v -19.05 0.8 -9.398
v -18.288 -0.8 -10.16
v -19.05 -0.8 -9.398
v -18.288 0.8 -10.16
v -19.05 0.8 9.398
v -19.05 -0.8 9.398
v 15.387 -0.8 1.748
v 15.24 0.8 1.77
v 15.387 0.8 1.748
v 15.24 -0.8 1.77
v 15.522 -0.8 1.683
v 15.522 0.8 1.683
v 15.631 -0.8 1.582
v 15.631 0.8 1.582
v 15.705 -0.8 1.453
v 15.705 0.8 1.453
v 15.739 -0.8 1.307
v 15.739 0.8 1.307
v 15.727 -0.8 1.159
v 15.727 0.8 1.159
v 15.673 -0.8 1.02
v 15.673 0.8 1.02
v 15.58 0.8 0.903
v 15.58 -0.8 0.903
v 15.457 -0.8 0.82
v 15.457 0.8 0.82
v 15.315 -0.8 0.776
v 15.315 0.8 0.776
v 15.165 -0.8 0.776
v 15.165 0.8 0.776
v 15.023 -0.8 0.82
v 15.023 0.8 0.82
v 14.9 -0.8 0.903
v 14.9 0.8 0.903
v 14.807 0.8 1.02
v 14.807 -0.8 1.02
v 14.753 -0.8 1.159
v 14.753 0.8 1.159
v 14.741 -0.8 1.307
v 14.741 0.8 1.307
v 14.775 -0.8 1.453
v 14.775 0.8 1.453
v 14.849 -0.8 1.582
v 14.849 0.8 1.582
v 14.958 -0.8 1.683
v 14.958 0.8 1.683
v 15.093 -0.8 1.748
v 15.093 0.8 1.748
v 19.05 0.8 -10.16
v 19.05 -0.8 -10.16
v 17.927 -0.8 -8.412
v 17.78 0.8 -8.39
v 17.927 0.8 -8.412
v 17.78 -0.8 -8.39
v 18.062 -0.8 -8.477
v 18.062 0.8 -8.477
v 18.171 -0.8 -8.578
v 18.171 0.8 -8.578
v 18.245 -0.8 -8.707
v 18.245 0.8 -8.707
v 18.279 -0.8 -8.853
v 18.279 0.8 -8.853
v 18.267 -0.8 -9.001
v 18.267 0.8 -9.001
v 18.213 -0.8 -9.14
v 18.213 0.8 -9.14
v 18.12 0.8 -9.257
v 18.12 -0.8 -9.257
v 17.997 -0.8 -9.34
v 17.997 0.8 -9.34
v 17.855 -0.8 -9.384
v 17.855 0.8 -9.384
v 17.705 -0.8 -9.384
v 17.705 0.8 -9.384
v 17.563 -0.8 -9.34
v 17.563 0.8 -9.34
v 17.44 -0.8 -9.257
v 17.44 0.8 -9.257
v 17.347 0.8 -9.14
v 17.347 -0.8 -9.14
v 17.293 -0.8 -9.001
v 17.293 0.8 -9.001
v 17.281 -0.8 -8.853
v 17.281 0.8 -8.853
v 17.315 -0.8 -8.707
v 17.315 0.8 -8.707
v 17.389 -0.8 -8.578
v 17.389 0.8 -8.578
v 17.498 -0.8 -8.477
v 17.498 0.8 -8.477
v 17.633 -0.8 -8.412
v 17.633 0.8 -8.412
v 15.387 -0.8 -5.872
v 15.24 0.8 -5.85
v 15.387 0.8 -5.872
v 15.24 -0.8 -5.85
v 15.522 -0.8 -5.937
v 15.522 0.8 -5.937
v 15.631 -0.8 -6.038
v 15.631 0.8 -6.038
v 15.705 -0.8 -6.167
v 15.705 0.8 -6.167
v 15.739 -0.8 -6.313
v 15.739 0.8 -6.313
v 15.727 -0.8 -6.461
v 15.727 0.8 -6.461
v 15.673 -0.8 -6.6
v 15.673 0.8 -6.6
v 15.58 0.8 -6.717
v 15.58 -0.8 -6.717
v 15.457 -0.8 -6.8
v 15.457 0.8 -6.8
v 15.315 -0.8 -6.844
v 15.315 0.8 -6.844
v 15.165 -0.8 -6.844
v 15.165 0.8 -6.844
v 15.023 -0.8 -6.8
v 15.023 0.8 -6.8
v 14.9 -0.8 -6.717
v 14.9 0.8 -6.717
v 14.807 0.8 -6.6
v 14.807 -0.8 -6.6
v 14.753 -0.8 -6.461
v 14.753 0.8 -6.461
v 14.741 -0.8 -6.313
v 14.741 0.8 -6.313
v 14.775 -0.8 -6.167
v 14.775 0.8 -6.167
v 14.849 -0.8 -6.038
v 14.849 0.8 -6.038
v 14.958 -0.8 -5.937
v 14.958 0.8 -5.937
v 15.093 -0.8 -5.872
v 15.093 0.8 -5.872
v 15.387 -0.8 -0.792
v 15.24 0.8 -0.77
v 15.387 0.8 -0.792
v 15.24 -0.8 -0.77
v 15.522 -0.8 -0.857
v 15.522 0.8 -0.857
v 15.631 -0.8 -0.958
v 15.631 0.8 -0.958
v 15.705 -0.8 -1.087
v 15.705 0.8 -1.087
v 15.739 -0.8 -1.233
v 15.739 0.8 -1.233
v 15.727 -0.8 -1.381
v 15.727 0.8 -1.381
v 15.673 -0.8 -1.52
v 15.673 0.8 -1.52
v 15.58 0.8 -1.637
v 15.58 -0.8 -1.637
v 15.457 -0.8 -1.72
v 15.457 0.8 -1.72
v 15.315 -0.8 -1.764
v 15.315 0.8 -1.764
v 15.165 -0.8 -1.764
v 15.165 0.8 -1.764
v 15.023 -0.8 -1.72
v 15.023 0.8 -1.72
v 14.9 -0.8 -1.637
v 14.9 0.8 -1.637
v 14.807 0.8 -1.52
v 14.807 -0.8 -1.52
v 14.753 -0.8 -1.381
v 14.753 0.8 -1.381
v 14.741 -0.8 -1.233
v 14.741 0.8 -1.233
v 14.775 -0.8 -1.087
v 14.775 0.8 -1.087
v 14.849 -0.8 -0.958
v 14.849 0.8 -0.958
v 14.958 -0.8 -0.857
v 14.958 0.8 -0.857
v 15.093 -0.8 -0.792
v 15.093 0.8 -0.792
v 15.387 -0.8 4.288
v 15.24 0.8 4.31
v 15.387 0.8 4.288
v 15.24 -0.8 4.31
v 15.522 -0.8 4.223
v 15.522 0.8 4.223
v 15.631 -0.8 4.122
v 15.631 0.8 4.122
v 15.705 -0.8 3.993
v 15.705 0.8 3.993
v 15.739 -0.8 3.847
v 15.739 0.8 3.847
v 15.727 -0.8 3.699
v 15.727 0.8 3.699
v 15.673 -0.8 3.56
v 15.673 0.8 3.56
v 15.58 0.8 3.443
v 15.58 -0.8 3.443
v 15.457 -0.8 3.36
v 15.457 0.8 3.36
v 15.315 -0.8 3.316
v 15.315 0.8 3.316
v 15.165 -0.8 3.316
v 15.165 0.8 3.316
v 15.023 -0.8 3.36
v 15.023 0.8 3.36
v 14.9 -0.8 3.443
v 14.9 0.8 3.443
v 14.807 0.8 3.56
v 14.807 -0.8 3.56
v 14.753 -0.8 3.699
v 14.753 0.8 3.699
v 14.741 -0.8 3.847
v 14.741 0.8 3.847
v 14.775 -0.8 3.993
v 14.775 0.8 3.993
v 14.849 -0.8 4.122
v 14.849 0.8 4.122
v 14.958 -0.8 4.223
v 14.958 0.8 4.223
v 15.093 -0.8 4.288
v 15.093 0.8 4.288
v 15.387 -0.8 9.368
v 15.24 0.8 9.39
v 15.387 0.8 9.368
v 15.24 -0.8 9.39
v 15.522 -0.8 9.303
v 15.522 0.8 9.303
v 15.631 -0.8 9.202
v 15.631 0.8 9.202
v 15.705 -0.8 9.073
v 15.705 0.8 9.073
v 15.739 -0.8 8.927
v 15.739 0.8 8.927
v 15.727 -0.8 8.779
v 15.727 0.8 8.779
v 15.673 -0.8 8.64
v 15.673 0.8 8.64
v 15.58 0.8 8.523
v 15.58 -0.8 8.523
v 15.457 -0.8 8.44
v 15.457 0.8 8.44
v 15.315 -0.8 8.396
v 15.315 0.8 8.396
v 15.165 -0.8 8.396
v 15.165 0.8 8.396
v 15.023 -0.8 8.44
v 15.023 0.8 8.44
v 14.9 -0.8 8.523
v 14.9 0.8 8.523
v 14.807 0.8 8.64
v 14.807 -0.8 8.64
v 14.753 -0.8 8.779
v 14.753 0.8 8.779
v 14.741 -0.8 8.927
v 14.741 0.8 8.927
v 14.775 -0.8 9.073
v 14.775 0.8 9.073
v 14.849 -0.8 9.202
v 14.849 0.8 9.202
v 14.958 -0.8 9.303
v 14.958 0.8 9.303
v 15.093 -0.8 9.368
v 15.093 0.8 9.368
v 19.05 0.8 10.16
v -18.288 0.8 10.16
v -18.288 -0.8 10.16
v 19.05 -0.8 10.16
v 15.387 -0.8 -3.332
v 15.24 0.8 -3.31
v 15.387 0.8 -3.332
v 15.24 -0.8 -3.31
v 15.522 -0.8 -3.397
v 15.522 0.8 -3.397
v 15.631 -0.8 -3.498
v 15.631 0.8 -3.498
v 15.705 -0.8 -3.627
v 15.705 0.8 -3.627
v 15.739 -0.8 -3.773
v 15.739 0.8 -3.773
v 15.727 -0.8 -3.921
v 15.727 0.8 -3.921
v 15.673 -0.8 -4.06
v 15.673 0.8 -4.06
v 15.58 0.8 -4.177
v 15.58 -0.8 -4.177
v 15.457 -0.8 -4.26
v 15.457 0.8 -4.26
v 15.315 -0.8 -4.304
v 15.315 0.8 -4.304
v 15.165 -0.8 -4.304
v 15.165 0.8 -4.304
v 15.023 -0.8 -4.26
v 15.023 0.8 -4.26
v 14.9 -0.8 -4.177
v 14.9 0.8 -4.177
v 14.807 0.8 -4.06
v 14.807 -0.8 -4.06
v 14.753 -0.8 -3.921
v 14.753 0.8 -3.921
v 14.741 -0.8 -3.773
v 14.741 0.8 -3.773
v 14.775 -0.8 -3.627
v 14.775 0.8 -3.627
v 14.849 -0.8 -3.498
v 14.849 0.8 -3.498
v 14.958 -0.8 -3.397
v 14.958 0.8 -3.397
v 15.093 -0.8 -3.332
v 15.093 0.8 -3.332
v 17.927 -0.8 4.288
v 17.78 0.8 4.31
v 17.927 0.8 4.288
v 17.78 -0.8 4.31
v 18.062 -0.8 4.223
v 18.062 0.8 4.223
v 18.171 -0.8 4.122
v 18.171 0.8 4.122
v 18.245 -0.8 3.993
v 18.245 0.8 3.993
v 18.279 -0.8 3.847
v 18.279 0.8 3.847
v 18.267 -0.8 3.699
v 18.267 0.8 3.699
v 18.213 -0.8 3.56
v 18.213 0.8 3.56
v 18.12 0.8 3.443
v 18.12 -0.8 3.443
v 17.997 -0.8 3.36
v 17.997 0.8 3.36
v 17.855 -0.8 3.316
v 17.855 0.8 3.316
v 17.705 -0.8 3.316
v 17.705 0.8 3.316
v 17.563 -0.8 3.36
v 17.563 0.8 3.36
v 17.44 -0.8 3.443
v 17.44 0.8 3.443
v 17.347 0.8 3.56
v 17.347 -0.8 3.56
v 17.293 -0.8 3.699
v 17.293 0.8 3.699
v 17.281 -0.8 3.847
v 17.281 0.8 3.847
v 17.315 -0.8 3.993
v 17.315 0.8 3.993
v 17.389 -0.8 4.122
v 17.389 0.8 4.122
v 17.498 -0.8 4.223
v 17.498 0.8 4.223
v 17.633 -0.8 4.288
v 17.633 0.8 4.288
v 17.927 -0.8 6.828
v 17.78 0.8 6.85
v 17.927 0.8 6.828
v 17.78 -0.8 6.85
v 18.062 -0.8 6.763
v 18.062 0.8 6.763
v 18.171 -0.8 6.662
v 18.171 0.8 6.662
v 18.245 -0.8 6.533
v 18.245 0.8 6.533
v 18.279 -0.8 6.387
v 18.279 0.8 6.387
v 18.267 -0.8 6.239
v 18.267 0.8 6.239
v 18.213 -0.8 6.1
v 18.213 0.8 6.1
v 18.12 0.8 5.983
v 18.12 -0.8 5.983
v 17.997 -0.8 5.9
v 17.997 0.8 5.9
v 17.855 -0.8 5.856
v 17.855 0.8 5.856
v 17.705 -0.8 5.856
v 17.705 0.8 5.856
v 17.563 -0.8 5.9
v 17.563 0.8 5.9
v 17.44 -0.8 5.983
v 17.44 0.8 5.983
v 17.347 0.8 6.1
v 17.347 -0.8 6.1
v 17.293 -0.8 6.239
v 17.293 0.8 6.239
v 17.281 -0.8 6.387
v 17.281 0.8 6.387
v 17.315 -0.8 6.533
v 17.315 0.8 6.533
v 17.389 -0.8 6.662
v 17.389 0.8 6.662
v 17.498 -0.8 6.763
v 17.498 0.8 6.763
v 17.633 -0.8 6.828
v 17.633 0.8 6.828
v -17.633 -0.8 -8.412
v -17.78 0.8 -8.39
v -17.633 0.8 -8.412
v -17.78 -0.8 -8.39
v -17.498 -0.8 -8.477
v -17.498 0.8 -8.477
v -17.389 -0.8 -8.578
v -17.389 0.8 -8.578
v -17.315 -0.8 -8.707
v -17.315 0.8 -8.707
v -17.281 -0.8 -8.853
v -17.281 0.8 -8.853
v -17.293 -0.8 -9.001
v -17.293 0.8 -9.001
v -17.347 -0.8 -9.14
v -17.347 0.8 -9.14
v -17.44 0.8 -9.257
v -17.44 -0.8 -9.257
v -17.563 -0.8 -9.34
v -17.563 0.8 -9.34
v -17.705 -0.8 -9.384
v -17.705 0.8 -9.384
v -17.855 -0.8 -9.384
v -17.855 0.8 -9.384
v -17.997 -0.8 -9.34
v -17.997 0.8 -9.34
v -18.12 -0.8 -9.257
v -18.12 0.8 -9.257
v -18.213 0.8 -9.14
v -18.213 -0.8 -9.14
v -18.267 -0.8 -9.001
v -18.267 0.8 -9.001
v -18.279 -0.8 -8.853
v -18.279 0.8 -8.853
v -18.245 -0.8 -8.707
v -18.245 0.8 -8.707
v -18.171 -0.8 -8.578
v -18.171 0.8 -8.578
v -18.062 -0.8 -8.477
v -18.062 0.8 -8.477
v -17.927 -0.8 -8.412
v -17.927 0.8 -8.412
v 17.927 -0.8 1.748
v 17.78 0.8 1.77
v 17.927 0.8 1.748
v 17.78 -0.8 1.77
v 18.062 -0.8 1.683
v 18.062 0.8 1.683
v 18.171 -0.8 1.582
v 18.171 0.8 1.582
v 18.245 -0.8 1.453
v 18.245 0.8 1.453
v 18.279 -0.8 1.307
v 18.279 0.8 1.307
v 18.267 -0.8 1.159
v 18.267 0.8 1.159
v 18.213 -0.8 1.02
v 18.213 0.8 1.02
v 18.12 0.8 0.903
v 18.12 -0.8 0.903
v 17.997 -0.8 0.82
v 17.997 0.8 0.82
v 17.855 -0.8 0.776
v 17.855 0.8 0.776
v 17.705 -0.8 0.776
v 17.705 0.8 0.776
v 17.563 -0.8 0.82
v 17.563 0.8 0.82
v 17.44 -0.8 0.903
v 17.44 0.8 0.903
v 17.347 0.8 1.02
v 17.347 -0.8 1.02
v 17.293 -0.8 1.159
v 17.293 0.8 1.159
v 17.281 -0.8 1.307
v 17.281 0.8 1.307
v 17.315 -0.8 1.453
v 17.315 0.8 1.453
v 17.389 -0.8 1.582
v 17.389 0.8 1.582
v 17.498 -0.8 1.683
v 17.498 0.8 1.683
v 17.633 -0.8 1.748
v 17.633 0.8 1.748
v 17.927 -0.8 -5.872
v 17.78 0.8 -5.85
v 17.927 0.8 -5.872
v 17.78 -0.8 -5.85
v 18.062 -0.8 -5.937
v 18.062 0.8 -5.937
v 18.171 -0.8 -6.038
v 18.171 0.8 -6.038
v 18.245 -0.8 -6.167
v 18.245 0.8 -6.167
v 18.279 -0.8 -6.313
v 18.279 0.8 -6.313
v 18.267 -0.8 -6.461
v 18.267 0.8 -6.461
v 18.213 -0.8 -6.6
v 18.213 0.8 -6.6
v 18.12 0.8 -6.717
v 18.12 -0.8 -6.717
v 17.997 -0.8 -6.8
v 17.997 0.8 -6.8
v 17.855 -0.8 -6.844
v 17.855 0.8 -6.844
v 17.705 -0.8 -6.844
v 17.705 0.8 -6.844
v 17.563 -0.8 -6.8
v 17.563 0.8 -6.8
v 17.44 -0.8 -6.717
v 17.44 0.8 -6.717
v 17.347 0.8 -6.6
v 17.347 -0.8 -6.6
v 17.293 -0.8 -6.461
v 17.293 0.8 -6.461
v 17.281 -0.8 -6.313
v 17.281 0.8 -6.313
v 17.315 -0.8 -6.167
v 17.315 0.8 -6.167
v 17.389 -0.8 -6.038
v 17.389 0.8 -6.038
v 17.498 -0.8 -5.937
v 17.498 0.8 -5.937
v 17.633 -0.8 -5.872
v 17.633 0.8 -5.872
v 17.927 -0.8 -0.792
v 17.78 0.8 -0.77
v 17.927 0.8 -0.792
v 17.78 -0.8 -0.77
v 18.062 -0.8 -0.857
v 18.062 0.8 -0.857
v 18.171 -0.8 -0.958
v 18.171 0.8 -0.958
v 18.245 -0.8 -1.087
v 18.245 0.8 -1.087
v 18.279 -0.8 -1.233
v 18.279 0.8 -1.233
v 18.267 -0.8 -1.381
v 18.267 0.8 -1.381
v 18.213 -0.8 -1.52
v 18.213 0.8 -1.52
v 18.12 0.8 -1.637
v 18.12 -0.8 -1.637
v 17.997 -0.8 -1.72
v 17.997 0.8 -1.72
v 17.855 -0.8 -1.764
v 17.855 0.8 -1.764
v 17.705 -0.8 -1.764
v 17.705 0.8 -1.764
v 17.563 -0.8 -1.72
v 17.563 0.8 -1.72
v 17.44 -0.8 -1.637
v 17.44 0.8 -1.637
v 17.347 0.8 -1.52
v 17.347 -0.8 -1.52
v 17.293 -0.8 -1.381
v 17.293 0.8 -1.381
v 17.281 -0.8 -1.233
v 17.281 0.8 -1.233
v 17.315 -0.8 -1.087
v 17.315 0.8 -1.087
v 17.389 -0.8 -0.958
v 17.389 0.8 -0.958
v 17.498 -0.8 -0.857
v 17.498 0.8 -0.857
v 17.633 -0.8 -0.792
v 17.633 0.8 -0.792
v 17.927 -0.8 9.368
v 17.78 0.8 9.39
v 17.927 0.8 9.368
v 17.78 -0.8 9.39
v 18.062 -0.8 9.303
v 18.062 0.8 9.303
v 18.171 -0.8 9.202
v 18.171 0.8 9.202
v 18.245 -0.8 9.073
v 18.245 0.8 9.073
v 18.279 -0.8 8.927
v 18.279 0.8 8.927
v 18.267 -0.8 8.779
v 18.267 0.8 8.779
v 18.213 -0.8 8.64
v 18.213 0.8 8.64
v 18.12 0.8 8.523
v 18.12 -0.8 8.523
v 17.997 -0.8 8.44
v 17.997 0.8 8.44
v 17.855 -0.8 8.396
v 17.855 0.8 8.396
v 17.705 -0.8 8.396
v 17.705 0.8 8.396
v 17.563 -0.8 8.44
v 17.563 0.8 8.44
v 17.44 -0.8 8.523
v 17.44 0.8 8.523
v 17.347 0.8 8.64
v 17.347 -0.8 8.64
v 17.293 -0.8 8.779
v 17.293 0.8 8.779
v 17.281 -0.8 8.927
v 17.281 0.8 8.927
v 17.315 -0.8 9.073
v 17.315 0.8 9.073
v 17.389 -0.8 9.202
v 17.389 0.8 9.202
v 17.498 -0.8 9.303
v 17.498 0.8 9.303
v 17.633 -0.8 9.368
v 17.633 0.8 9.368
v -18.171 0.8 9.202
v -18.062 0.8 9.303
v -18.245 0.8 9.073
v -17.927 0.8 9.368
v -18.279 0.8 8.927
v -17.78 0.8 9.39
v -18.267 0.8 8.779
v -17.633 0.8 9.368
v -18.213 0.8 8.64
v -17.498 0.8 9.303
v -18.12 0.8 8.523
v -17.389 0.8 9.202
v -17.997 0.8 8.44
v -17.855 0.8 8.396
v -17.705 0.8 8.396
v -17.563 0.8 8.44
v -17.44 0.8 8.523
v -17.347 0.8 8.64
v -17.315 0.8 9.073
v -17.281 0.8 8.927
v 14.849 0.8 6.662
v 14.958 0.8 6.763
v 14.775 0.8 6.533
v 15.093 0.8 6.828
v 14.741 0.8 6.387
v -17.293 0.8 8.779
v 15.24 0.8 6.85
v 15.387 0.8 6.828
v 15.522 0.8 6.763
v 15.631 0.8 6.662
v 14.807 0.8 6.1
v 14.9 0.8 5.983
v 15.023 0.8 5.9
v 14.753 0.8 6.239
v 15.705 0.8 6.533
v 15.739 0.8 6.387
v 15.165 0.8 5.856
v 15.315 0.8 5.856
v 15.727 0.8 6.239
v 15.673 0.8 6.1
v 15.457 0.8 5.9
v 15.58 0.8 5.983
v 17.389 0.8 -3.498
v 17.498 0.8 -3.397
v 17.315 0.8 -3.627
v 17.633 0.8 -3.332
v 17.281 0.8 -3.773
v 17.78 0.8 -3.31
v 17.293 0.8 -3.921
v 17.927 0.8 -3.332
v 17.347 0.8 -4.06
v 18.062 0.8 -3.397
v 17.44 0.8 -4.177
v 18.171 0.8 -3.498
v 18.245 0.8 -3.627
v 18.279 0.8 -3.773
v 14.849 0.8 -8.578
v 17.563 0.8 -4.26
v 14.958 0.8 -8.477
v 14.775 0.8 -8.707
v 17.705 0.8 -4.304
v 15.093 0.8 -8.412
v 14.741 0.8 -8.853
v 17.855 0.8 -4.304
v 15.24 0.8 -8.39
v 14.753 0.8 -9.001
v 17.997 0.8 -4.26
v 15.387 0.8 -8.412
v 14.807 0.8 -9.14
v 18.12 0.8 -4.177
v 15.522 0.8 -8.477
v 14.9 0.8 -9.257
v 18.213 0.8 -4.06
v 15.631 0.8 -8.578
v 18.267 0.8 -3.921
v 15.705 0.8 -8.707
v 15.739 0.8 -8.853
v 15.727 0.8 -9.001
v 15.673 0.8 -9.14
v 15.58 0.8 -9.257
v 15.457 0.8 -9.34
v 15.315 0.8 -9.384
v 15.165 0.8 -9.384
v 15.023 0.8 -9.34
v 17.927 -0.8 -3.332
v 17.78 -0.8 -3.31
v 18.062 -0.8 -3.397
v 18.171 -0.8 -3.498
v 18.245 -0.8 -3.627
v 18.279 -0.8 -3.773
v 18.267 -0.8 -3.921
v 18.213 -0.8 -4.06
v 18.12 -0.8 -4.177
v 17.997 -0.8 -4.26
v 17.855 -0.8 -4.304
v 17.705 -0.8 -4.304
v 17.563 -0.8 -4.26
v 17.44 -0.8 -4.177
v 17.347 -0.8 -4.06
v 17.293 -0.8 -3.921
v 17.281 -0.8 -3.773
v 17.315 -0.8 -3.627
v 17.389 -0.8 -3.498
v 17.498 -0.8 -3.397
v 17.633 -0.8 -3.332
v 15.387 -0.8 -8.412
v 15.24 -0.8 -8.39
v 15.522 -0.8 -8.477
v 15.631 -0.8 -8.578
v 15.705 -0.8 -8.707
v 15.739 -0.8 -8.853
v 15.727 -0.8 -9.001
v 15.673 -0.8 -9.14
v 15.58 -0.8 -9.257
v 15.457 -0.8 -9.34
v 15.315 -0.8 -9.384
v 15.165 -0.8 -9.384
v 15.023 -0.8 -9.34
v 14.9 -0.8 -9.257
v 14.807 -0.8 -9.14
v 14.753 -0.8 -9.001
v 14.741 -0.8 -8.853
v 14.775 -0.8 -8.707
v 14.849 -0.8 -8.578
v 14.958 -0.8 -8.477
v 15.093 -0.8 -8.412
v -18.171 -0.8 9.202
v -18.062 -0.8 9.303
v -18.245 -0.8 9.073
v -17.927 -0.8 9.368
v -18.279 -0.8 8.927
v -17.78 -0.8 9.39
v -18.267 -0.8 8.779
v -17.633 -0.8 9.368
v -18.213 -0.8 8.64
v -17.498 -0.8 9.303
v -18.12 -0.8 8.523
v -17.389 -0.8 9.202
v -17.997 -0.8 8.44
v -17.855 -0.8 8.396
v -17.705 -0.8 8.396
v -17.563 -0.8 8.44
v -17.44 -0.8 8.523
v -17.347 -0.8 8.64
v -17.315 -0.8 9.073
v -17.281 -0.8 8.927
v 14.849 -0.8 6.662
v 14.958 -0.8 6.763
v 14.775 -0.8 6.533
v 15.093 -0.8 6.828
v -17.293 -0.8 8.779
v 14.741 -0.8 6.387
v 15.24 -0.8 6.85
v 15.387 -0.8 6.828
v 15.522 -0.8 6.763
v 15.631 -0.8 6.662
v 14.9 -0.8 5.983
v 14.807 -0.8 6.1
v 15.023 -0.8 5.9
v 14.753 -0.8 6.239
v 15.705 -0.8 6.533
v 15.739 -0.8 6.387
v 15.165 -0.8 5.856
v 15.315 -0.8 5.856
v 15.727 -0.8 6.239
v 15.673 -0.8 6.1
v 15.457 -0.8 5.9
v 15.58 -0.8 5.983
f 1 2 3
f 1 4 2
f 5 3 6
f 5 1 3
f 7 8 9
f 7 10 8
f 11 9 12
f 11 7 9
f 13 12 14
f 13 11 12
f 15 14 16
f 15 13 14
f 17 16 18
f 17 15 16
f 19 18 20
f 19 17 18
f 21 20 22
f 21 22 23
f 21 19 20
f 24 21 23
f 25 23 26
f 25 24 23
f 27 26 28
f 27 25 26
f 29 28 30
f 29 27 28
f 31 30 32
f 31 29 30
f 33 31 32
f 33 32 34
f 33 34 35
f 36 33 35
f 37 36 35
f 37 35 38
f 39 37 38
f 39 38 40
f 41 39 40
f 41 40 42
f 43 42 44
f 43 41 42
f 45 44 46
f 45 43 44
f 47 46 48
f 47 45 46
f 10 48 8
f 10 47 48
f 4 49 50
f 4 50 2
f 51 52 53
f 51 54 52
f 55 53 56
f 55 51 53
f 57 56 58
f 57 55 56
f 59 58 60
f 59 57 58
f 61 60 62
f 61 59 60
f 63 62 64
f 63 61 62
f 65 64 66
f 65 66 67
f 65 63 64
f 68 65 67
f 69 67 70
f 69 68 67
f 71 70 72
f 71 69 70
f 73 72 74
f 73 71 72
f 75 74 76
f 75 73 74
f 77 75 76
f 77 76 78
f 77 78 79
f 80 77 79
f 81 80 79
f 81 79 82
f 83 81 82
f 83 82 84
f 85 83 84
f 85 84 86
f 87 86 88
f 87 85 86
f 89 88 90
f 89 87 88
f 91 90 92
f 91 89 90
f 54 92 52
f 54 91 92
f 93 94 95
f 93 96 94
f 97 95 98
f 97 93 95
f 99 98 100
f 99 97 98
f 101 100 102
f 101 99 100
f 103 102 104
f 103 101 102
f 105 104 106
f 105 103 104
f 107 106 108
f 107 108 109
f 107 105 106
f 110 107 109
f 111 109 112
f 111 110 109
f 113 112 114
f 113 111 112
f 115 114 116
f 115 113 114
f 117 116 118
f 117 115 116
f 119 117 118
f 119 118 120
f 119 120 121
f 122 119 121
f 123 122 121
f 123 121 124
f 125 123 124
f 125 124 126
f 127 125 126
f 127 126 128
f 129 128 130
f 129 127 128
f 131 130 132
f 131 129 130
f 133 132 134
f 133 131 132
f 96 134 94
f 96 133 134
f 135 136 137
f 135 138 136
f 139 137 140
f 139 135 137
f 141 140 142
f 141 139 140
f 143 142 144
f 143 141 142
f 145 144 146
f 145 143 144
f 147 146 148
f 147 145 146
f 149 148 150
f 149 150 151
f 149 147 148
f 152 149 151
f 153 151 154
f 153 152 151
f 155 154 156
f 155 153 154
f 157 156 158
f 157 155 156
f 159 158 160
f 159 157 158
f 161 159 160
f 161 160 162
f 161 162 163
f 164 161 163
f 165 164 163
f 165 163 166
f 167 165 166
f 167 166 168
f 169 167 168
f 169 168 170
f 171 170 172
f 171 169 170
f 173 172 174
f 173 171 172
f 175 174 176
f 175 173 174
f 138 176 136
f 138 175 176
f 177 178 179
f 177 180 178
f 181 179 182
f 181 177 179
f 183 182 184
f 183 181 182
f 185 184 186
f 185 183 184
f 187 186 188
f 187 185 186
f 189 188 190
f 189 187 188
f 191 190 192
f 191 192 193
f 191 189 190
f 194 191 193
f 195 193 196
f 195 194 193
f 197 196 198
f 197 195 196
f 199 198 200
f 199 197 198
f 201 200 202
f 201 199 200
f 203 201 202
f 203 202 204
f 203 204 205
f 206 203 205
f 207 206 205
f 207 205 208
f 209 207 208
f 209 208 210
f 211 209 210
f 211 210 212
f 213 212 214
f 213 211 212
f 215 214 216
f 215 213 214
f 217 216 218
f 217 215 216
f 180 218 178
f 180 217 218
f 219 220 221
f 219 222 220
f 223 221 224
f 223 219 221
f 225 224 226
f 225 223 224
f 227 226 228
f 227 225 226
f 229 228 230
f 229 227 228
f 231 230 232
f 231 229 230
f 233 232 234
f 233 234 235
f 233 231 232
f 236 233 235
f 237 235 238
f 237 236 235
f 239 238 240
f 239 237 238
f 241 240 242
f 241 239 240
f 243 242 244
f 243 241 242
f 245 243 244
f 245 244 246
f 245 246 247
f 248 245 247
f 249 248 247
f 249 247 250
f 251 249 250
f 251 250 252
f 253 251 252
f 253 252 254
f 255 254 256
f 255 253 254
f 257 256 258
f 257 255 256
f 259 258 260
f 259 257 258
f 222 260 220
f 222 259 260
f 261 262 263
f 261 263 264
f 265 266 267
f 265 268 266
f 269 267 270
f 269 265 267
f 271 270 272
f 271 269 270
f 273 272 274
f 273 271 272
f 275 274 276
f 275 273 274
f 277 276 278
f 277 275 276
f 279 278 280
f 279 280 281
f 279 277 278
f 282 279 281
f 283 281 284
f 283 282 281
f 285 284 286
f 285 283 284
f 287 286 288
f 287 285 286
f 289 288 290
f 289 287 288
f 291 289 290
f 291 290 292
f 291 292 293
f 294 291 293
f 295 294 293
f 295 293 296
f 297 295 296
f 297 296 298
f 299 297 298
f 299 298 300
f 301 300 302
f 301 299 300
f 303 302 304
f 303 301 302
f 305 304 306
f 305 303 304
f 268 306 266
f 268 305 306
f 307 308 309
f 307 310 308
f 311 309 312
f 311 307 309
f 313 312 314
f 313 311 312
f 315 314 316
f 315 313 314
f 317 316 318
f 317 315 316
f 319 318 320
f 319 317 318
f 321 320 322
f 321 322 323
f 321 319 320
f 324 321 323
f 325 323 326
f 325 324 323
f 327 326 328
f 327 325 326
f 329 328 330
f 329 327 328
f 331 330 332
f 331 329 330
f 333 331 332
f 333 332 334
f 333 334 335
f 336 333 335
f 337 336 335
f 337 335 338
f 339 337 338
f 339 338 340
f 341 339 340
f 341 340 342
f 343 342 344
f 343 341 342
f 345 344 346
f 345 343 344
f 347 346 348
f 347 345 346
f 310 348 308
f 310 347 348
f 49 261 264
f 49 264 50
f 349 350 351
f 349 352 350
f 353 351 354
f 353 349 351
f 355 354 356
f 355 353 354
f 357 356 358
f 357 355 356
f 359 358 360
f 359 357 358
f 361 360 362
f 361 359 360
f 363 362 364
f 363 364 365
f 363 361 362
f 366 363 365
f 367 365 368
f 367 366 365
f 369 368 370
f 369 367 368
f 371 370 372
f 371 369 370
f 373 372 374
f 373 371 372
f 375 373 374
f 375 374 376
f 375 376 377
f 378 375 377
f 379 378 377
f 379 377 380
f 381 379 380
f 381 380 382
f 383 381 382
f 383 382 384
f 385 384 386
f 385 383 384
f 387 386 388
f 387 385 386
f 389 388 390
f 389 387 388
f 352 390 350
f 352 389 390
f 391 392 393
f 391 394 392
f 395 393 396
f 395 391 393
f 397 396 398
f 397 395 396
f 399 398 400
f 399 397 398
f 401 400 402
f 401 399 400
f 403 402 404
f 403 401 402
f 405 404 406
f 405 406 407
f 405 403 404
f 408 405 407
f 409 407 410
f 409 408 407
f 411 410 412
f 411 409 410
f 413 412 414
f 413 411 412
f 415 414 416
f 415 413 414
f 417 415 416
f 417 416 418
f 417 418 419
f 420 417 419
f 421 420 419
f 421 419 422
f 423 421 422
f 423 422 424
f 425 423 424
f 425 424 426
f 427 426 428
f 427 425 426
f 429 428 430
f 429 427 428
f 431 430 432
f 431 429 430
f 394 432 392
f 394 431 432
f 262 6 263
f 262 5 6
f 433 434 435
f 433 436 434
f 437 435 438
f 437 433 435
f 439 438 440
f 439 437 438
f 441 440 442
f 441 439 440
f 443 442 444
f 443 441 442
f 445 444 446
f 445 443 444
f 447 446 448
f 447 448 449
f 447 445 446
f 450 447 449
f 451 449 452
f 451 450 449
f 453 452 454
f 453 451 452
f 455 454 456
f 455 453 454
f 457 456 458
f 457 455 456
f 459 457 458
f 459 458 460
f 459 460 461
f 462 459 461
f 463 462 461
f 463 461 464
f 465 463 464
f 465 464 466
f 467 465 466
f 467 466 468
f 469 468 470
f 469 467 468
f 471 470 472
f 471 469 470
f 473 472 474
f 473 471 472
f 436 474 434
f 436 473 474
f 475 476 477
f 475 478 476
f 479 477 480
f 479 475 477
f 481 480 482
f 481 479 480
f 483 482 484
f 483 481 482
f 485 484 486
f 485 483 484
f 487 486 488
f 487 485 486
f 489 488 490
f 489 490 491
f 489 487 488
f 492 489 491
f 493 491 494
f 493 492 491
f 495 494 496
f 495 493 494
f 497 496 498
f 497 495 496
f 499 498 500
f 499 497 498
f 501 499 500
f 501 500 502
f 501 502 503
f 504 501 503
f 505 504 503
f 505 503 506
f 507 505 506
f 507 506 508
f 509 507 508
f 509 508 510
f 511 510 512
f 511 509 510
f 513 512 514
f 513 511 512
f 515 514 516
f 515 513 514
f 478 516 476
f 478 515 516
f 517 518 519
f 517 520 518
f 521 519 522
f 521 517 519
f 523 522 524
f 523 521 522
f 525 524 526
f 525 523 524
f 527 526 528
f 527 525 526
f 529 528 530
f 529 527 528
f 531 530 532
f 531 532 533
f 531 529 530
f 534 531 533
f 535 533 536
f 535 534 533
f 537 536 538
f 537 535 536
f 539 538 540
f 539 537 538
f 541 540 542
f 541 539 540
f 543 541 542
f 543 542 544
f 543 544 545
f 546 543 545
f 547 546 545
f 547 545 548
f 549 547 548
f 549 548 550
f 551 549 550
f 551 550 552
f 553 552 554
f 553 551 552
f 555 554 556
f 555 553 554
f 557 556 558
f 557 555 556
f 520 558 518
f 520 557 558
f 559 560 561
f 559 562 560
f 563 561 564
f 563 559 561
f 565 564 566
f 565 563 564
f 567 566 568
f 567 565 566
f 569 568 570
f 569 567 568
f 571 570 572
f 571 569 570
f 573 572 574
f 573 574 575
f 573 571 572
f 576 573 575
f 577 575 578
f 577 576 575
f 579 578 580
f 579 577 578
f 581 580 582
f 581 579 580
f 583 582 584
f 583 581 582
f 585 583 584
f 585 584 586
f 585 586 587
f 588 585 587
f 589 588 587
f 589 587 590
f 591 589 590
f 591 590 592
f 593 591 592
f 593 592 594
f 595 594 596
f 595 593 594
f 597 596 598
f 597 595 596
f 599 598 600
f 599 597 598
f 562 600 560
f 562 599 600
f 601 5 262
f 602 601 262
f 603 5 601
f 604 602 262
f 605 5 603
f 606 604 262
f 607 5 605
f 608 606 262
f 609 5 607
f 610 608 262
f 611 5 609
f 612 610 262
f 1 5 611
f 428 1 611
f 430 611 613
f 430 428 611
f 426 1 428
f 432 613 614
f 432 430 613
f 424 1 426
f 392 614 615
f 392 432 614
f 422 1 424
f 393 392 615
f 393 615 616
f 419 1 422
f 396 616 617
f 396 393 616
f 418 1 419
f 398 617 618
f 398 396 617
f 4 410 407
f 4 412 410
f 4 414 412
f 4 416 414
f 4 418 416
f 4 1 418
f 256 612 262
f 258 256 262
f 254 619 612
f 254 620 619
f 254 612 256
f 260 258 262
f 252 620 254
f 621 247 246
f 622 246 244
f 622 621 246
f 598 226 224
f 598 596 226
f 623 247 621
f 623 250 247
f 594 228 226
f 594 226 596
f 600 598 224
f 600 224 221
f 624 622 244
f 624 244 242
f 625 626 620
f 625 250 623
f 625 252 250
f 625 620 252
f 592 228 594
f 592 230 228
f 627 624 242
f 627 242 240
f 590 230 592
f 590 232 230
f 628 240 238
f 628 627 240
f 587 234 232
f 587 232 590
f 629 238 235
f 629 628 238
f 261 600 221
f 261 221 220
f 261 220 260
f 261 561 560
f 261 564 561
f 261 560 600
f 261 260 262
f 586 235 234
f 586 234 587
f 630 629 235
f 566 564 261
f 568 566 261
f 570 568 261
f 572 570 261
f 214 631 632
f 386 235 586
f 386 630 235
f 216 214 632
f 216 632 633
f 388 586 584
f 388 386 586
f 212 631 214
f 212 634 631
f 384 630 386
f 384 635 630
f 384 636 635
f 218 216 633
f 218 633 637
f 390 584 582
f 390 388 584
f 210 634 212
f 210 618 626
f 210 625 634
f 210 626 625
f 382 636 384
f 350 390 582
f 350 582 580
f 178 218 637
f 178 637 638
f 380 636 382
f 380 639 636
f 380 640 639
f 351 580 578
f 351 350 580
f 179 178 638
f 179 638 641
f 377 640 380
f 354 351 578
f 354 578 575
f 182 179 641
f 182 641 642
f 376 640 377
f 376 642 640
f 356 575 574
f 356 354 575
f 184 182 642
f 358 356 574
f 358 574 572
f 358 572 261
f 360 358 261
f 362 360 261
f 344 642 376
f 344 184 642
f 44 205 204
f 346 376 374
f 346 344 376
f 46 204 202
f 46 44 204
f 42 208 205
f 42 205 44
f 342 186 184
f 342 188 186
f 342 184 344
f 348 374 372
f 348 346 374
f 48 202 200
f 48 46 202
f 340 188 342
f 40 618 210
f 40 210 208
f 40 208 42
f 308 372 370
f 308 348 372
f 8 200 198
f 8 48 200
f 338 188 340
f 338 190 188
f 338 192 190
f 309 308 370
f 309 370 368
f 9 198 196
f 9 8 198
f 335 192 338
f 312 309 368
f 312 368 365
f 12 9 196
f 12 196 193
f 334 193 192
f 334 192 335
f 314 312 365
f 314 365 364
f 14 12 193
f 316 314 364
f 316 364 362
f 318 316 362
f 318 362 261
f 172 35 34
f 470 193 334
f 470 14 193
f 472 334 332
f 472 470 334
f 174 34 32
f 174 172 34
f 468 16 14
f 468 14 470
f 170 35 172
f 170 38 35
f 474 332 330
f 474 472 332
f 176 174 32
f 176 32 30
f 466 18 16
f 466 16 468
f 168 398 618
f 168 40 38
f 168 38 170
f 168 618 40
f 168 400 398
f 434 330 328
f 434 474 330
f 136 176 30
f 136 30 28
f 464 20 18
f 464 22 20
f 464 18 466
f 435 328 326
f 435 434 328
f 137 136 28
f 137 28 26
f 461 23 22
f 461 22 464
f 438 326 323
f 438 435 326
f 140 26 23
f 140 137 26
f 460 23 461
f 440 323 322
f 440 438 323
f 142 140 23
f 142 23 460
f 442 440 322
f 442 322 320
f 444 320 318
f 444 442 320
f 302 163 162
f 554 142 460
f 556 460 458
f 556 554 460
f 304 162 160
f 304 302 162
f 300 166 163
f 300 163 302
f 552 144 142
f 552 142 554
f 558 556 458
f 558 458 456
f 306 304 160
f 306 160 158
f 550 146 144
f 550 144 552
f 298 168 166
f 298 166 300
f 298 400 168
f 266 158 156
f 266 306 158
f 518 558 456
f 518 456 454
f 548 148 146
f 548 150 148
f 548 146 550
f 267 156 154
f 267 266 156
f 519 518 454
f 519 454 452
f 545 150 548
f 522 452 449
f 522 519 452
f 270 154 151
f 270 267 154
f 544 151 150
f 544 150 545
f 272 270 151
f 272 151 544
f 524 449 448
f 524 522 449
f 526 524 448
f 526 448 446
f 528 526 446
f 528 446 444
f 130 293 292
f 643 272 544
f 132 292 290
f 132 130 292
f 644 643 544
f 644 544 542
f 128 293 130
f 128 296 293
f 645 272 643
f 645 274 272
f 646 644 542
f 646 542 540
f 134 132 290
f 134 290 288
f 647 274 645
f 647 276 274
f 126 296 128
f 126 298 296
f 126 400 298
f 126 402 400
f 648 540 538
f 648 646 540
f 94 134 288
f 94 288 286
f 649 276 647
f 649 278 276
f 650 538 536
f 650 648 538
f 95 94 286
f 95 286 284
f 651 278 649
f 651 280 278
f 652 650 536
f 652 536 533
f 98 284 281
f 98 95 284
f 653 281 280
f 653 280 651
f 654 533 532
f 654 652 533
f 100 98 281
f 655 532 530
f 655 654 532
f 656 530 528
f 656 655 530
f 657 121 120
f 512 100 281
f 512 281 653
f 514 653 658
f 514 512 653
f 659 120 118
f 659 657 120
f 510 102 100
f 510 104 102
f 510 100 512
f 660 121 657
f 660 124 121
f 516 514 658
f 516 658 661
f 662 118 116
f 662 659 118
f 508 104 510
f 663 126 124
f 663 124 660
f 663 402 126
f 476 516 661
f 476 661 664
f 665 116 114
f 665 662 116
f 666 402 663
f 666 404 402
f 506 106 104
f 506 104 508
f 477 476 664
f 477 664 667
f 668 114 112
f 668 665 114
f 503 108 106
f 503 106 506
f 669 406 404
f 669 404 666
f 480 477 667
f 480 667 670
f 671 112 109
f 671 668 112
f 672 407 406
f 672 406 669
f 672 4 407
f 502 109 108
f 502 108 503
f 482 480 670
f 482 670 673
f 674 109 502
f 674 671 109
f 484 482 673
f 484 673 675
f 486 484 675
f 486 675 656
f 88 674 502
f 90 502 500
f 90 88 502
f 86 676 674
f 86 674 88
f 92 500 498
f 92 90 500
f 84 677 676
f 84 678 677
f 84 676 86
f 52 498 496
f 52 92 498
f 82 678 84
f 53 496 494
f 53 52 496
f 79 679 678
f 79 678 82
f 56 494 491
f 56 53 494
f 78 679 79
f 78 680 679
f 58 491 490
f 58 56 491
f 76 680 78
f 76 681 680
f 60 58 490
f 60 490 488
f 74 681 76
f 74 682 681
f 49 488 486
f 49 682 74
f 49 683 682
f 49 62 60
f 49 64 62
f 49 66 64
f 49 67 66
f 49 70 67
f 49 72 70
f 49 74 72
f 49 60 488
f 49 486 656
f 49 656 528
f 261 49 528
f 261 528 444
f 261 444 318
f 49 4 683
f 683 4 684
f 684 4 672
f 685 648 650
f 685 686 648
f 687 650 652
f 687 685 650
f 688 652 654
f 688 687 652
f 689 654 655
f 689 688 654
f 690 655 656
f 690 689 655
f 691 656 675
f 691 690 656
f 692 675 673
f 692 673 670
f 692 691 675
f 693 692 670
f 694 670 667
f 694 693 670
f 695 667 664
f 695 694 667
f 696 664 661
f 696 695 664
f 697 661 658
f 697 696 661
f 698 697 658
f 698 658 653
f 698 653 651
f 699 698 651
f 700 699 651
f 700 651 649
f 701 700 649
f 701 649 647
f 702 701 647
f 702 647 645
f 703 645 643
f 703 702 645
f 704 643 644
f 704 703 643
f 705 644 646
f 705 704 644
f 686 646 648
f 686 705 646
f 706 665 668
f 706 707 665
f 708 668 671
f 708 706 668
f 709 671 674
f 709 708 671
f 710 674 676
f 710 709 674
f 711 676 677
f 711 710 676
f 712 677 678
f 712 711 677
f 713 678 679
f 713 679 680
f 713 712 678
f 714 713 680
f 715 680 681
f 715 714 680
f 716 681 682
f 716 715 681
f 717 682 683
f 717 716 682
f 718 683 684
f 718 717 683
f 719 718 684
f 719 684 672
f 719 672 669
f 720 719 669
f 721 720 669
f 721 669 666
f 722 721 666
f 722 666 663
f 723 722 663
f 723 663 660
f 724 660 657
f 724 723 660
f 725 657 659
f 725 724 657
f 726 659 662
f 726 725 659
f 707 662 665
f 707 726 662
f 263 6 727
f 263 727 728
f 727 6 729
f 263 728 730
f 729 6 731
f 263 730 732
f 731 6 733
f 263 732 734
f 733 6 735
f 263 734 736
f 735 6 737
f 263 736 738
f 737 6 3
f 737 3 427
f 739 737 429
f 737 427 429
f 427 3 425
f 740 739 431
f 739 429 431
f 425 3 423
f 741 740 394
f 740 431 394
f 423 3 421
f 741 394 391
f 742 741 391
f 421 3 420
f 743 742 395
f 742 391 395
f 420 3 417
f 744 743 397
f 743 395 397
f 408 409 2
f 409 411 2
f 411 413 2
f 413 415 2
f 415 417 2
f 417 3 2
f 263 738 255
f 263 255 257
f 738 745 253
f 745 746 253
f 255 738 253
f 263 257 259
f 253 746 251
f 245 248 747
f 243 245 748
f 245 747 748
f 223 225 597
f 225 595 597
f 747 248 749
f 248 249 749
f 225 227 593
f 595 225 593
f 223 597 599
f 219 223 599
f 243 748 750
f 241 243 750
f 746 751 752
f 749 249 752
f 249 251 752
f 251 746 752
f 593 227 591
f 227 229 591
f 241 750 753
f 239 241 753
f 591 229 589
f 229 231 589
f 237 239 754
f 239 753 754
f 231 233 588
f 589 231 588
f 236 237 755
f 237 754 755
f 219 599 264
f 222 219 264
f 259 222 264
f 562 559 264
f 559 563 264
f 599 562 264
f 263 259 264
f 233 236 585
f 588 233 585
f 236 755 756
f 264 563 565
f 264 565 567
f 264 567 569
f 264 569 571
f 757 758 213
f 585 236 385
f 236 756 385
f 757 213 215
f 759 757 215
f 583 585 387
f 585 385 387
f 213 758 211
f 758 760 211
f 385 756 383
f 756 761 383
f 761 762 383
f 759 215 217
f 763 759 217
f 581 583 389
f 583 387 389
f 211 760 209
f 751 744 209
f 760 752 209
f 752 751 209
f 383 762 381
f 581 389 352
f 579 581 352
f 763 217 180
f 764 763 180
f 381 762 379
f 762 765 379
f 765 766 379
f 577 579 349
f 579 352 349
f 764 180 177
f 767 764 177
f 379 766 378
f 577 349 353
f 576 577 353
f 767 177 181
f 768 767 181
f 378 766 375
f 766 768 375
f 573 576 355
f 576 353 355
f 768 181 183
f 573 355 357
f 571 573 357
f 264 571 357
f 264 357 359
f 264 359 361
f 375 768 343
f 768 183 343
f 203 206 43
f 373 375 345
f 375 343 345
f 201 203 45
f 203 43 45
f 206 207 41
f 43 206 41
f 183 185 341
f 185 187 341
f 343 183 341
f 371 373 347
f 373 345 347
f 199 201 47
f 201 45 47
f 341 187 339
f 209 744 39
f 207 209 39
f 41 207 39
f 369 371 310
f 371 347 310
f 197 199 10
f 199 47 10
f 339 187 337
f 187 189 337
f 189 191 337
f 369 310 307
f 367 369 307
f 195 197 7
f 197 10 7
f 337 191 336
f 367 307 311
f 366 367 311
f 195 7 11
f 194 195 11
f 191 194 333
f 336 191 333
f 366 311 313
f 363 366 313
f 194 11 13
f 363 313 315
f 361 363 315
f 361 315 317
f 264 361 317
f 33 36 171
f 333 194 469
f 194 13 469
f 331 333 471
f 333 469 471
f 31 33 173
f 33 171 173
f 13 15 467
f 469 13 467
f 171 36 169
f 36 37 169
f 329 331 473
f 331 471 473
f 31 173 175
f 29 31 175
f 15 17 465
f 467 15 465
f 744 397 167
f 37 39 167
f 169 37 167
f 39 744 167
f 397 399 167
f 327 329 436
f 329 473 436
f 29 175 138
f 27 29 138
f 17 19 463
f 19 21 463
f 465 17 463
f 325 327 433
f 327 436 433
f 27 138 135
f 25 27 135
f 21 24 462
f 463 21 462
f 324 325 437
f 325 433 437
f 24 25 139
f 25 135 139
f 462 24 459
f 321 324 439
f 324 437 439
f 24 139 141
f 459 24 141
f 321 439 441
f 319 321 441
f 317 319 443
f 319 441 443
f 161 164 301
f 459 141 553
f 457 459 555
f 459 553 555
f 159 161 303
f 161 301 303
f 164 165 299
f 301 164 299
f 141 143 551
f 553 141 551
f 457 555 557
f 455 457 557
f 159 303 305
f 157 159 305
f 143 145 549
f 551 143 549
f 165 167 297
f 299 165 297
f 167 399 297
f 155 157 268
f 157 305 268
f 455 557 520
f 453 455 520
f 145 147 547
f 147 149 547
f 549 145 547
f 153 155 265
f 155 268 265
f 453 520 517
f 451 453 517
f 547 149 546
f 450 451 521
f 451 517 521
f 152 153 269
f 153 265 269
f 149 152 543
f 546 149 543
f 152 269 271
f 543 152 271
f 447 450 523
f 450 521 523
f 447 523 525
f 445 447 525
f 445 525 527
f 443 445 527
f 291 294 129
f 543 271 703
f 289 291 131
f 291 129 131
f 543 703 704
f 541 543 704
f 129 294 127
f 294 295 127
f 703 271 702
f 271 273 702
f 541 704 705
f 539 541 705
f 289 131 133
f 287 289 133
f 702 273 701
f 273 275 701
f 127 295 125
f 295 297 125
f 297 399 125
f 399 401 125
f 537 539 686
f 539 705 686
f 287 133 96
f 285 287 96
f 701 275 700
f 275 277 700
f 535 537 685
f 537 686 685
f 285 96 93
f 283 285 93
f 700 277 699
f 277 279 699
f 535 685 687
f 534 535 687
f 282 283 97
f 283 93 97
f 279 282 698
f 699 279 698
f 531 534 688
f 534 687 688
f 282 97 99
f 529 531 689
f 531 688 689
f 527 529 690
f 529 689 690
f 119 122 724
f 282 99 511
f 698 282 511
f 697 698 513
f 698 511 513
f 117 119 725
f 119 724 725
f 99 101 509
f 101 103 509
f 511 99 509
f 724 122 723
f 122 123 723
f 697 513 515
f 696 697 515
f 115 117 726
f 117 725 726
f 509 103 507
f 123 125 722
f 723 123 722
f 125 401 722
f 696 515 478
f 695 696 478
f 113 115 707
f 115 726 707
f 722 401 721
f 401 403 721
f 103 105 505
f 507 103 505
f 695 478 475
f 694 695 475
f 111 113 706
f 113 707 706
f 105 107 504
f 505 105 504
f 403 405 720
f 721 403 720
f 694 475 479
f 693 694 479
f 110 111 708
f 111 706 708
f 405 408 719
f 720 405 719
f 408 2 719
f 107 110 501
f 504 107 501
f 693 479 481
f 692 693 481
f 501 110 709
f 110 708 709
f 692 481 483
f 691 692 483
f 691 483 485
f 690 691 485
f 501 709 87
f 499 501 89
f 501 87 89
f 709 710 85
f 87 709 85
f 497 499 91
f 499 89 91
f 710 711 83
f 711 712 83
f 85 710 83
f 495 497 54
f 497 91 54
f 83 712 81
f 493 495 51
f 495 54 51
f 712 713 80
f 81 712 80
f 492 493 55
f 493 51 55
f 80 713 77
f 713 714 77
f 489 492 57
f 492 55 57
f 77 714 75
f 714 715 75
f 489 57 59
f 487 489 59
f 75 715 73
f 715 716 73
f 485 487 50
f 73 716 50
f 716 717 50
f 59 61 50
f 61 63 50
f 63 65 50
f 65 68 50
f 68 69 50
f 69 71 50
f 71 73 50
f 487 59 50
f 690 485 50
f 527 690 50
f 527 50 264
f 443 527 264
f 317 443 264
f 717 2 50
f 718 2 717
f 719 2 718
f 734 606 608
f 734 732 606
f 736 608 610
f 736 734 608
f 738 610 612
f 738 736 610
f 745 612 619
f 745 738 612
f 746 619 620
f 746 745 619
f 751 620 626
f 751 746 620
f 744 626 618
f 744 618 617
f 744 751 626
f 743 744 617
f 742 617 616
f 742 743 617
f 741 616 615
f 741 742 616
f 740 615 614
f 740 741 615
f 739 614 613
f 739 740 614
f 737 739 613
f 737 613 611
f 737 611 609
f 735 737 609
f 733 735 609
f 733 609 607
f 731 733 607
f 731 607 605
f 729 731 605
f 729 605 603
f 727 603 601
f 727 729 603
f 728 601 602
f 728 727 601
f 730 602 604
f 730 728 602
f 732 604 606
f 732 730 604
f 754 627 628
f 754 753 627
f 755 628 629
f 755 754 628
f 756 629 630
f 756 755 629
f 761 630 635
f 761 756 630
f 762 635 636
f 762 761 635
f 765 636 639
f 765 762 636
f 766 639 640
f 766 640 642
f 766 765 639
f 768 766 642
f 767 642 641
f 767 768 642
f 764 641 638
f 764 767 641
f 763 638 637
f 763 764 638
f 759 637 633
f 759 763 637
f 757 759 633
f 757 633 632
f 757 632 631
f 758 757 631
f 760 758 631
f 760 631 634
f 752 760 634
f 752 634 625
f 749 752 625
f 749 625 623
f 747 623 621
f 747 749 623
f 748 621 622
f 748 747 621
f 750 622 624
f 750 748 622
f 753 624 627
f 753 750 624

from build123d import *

# Parameters (mm, degrees)
SKETCH1_R           = 0.5
BOSS_EXTRUDE1_DEPTH = 0.8


with BuildPart() as part:
    # Sketch1 → Boss-Extrude1 (new, symmetric)
    with BuildSketch(Plane(origin=(0, 0, 0), x_dir=(1, 0, 0), z_dir=(0, 1, 0))):
        Polygon((-19.05, -9.398), (-18.288, -10.16), (19.05, -10.16), (19.05, 10.16), (-18.288, 10.16), (-19.05, 9.398), align=None)
        with Locations(Location((-17.78, -8.89, 0), (0, 0, 270))):
            Circle(SKETCH1_R, mode=Mode.SUBTRACT)
        with Locations(Location((15.24, -8.89, 0), (0, 0, 270))):
            Circle(SKETCH1_R, mode=Mode.SUBTRACT)
        with Locations(Location((17.78, -8.89, 0), (0, 0, 270))):
            Circle(SKETCH1_R, mode=Mode.SUBTRACT)
        with Locations(Location((15.24, -6.35, 0), (0, 0, 270))):
            Circle(SKETCH1_R, mode=Mode.SUBTRACT)
        with Locations(Location((17.78, -6.35, 0), (0, 0, 270))):
            Circle(SKETCH1_R, mode=Mode.SUBTRACT)
        with Locations(Location((15.24, -3.81, 0), (0, 0, 270))):
            Circle(SKETCH1_R, mode=Mode.SUBTRACT)
        with Locations(Location((17.78, -3.81, 0), (0, 0, 270))):
            Circle(SKETCH1_R, mode=Mode.SUBTRACT)
        with Locations(Location((15.24, -1.27, 0), (0, 0, 270))):
            Circle(SKETCH1_R, mode=Mode.SUBTRACT)
        with Locations(Location((17.78, -1.27, 0), (0, 0, 270))):
            Circle(SKETCH1_R, mode=Mode.SUBTRACT)
        with Locations(Location((-17.78, 8.89, 0), (0, 0, 270))):
            Circle(SKETCH1_R, mode=Mode.SUBTRACT)
        with Locations(Location((15.24, 1.27, 0), (0, 0, 270))):
            Circle(SKETCH1_R, mode=Mode.SUBTRACT)
        with Locations(Location((17.78, 1.27, 0), (0, 0, 270))):
            Circle(SKETCH1_R, mode=Mode.SUBTRACT)
        with Locations(Location((15.24, 3.81, 0), (0, 0, 270))):
            Circle(SKETCH1_R, mode=Mode.SUBTRACT)
        with Locations(Location((17.78, 3.81, 0), (0, 0, 270))):
            Circle(SKETCH1_R, mode=Mode.SUBTRACT)
        with Locations(Location((15.24, 6.35, 0), (0, 0, 270))):
            Circle(SKETCH1_R, mode=Mode.SUBTRACT)
        with Locations(Location((17.78, 6.35, 0), (0, 0, 270))):
            Circle(SKETCH1_R, mode=Mode.SUBTRACT)
        with Locations(Location((15.24, 8.89, 0), (0, 0, 270))):
            Circle(SKETCH1_R, mode=Mode.SUBTRACT)
        with Locations(Location((17.78, 8.89, 0), (0, 0, 270))):
            Circle(SKETCH1_R, mode=Mode.SUBTRACT)
    extrude(amount=BOSS_EXTRUDE1_DEPTH, both=True)


solid = part.part
